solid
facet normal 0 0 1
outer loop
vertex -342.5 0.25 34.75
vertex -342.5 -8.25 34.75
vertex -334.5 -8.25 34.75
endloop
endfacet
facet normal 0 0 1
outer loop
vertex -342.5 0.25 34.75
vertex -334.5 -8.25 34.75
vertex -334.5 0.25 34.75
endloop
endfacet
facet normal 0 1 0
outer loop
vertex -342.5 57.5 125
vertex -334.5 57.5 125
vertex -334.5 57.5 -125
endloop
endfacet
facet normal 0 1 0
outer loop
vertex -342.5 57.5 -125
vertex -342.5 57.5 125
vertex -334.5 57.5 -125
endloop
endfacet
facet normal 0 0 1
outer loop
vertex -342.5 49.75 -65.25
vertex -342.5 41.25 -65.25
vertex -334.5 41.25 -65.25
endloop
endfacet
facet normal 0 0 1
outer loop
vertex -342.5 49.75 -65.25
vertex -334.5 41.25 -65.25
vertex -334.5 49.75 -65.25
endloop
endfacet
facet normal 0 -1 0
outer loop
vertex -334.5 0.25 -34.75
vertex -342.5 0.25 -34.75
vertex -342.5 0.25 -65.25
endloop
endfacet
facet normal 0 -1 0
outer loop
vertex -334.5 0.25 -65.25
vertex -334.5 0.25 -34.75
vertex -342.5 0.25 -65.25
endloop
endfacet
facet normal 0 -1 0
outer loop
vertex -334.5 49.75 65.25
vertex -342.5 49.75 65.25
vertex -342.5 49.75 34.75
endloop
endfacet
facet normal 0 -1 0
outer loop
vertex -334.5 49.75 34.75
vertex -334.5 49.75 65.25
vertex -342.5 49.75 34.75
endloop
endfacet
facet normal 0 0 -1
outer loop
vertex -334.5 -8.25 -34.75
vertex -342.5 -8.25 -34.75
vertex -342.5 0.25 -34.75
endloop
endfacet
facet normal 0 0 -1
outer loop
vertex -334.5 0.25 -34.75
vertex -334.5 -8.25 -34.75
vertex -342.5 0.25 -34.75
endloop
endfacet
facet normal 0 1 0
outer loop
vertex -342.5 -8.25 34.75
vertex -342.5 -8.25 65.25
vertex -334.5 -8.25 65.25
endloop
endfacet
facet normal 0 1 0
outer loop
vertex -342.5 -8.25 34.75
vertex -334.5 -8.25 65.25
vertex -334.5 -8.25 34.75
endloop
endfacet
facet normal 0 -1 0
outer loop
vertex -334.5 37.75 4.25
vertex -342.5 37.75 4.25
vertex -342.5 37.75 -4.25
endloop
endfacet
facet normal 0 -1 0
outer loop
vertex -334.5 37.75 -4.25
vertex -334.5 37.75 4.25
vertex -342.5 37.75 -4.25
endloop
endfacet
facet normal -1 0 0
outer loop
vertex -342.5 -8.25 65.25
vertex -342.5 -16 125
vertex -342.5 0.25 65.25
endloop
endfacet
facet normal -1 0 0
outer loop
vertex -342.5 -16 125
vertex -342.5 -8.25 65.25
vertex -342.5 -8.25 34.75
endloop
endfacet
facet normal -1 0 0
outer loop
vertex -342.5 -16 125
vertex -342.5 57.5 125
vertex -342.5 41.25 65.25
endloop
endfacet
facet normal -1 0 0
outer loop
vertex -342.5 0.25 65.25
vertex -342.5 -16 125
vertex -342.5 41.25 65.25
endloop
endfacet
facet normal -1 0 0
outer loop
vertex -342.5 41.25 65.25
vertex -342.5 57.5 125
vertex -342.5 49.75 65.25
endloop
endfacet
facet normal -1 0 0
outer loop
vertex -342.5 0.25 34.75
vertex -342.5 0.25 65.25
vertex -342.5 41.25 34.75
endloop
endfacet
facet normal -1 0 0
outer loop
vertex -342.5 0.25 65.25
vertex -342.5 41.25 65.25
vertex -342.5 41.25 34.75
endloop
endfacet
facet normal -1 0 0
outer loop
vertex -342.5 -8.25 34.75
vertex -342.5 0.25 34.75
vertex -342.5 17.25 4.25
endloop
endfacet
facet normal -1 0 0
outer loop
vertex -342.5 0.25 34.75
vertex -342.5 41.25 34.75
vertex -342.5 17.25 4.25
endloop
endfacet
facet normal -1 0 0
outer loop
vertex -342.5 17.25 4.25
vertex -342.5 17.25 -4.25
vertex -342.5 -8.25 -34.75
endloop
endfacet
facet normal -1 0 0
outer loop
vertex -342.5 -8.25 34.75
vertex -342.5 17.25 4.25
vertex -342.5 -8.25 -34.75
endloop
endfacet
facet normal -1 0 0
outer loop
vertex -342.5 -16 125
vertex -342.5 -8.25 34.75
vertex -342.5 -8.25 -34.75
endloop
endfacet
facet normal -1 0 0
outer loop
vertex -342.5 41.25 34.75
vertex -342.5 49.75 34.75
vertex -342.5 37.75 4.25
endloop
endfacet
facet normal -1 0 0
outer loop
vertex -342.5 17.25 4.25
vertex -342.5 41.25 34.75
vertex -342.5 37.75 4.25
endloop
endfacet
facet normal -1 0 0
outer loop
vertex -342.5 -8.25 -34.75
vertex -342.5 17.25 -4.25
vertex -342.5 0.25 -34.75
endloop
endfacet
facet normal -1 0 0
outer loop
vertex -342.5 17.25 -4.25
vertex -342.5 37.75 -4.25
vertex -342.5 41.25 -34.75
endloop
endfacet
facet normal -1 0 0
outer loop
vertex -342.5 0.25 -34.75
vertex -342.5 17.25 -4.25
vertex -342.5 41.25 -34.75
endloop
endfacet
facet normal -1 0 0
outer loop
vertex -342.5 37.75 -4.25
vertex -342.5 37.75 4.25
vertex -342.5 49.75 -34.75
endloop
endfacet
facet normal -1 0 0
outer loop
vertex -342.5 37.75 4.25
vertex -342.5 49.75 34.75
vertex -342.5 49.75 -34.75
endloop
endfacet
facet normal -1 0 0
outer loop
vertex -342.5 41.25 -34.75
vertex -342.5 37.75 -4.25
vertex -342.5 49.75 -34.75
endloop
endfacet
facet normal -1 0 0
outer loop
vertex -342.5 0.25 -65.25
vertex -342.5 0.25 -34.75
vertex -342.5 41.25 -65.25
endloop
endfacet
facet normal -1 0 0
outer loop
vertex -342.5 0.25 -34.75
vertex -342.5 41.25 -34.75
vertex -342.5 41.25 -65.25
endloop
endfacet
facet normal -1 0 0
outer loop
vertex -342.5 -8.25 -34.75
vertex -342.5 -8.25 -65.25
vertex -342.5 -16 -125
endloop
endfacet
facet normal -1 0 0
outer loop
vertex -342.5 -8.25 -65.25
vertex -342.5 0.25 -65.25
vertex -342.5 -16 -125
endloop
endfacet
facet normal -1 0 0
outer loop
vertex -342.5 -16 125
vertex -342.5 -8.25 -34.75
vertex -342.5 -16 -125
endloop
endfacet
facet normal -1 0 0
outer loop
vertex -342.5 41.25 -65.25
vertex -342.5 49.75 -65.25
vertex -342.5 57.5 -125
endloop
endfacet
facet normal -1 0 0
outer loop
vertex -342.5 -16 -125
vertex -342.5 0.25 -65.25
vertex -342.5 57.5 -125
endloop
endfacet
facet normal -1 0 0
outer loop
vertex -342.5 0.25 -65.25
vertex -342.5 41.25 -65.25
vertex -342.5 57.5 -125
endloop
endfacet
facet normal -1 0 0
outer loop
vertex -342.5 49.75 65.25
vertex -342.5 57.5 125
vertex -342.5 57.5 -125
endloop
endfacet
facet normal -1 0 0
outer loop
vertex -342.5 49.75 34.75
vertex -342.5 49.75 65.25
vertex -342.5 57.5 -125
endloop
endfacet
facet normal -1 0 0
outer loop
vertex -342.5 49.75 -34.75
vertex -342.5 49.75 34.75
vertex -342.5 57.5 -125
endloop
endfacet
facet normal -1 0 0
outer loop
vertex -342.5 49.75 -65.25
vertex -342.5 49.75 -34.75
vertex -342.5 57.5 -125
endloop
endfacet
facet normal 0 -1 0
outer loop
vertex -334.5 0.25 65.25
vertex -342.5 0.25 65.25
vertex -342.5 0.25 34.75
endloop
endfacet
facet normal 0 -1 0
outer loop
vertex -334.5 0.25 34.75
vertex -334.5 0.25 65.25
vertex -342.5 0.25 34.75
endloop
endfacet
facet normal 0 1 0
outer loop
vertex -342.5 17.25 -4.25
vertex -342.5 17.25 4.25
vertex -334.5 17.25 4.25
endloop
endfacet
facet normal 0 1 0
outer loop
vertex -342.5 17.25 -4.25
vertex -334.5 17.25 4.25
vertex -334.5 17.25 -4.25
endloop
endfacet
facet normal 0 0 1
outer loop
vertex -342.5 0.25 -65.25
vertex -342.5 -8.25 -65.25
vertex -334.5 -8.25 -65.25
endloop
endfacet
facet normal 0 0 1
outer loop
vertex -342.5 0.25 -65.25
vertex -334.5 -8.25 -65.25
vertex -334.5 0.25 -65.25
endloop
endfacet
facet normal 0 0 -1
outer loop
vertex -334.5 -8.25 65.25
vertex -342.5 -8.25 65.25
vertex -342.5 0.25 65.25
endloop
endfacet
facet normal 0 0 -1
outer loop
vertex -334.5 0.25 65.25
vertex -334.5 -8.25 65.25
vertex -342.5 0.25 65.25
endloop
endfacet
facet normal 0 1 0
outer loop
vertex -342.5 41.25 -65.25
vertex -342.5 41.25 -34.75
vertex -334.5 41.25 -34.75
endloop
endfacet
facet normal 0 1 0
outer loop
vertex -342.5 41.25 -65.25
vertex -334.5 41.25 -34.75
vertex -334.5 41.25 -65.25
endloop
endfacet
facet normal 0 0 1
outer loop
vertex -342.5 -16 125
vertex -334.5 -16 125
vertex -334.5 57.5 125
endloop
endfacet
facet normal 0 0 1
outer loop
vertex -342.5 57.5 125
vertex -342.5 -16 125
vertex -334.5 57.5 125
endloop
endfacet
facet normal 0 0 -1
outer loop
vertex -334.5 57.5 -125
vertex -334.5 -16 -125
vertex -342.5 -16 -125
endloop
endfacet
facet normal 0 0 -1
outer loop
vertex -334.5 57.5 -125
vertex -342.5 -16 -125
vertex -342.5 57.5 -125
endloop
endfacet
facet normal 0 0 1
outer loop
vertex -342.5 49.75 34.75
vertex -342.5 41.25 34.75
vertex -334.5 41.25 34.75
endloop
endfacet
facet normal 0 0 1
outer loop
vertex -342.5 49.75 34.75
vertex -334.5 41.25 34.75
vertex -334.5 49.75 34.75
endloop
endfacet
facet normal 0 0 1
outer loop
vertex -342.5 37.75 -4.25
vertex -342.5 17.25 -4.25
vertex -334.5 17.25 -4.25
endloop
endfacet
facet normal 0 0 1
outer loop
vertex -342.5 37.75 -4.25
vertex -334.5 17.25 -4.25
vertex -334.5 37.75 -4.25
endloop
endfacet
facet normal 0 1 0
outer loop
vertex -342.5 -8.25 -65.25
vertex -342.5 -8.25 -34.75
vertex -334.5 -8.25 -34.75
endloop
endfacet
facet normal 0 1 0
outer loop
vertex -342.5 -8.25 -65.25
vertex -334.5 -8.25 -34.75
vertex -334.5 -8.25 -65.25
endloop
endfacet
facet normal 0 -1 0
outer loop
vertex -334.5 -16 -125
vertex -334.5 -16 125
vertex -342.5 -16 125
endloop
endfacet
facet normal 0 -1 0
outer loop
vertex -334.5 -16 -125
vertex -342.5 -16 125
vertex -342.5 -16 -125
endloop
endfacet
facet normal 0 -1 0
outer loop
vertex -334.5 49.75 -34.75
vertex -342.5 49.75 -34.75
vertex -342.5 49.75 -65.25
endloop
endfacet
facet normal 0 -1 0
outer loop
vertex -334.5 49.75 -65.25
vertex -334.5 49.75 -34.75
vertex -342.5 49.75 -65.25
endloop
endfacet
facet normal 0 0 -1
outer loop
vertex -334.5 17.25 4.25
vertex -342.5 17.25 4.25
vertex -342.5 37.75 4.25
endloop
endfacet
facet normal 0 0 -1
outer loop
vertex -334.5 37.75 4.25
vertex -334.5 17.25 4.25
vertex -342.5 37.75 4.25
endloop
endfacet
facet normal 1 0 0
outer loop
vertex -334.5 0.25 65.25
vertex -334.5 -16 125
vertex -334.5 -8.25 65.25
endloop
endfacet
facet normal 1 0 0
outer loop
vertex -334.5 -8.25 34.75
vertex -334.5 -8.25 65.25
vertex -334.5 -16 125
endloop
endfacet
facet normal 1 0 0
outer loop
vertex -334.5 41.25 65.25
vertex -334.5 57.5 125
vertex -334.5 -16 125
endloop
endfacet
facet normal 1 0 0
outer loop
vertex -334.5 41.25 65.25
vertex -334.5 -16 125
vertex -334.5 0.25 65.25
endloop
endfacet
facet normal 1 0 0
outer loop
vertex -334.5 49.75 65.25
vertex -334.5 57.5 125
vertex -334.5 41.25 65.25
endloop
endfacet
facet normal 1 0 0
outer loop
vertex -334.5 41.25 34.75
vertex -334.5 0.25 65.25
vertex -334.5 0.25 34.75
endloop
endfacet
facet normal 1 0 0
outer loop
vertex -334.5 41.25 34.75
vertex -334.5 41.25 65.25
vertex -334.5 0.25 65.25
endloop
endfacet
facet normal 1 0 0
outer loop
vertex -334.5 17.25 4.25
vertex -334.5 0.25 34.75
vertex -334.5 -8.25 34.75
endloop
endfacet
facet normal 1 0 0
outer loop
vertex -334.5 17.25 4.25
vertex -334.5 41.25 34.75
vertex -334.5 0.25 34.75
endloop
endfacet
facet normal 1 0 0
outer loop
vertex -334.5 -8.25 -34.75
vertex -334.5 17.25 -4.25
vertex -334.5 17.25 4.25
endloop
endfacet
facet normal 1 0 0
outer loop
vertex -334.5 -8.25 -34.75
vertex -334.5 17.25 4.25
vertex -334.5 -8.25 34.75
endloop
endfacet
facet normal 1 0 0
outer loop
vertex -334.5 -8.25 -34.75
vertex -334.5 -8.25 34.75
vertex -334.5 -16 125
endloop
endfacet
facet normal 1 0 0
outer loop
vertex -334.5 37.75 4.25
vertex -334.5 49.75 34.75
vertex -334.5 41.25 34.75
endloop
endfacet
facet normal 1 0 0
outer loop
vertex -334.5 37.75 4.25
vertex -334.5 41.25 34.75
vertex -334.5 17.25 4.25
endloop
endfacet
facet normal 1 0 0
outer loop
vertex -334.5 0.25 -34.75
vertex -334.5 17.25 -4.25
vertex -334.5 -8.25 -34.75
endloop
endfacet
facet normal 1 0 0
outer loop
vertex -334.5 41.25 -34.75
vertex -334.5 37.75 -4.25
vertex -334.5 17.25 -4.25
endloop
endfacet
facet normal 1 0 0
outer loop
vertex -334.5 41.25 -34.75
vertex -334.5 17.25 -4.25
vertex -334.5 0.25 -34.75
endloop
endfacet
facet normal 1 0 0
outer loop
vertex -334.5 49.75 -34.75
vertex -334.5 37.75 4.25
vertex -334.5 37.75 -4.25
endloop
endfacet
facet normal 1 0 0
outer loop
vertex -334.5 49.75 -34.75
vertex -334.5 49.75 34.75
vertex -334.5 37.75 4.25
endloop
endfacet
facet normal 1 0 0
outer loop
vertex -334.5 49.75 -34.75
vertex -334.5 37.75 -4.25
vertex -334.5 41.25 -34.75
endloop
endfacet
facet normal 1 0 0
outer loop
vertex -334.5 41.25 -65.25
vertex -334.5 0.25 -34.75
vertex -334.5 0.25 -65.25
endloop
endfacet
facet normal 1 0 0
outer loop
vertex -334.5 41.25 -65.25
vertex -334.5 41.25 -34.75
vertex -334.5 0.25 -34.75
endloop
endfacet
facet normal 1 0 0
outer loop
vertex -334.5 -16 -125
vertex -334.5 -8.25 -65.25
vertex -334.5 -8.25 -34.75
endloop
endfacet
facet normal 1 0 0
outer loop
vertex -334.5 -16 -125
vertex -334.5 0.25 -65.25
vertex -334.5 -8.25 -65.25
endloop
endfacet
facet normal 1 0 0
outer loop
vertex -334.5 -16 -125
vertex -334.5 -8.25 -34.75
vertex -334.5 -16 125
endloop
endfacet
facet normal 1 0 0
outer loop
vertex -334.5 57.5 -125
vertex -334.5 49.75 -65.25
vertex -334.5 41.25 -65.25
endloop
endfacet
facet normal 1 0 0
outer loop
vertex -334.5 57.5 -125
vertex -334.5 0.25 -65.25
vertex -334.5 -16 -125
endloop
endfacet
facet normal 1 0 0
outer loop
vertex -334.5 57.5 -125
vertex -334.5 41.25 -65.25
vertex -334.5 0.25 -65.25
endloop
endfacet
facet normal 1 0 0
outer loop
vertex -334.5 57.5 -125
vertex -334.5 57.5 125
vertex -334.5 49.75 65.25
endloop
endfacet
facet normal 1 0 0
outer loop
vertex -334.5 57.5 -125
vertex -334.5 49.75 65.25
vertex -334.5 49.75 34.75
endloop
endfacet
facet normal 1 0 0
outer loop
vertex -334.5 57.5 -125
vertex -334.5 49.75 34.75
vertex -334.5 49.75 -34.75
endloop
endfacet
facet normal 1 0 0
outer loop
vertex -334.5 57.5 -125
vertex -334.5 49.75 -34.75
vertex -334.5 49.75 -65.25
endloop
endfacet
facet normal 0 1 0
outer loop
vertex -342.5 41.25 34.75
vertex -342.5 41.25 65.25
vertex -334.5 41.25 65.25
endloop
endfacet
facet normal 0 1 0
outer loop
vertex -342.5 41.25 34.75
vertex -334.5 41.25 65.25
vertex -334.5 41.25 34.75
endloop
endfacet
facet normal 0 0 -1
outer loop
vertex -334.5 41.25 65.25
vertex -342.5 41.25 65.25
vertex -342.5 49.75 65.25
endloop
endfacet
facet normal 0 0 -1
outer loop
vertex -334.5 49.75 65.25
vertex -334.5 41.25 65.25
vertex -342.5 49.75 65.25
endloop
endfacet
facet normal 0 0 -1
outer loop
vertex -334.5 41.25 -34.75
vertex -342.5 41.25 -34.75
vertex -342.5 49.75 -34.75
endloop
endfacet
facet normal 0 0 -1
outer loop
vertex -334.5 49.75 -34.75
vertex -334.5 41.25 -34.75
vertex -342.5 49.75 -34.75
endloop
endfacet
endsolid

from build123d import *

# Parameters (mm, degrees)
SKETCH1_W           = 685
SKETCH1_H           = 250
BASE_FLANGE1_DEPTH  = 8
SKETCH6_W           = 60
SKETCH6_H           = 8
SKETCH6_W_2         = 70
EXTRUDE1_DEPTH      = 8
SKETCH7_W           = 250
SKETCH7_H           = 73.5
BASE_FLANGE2_DEPTH  = 8
SKETCH12_W          = 30.5
SKETCH12_H          = 8.5
EXTRUDE2_DEPTH      = 699.681794525
SKETCH14_W          = 250
SKETCH14_H          = 8
BASE_FLANGE3_DEPTH  = 50.5
SKETCH19_W          = 60
SKETCH19_H          = 8
SKETCH19_W_2        = 70
EXTRUDE3_DEPTH      = 8
BREAK_CORNER1_START = 41.5
BREAK_CORNER1_DEPTH = 8
EXTRUDE4_DEPTH      = 8
BASE_FLANGE4_DEPTH  = 8
SKETCH38_W          = 8.5
SKETCH38_H          = 20.5
EXTRUDE5_DEPTH      = 10
SKETCH39_W          = 20.5
SKETCH39_H          = 8.5
EXTRUDE6_DEPTH      = 10


# Read off the part's stored shape, not the designer's step: Break-Corner1
# Sheet-metal steps are written as plain solids
with BuildPart() as part:
    # Sketch1 → Base-Flange1 (new body)
    with BuildSketch(Plane(origin=(0, 0, 0), x_dir=(1, 0, 0), z_dir=(0, 1, 0))):
        Rectangle(SKETCH1_W, SKETCH1_H)
    extrude(amount=-BASE_FLANGE1_DEPTH)

    # Sketch6 → Extrude1 (cut)
    with BuildSketch(Plane(origin=(342.5, 0, 0), x_dir=(0, 0, -1), z_dir=(1, 0, 0))):
        with Locations((-95, -4)):
            Rectangle(SKETCH6_W, SKETCH6_H)
        with Locations((95, -4)):
            Rectangle(SKETCH6_W, SKETCH6_H)
        with Locations((0, -4)):
            Rectangle(SKETCH6_W_2, SKETCH6_H)
    extrude1 = extrude(amount=-EXTRUDE1_DEPTH, mode=Mode.SUBTRACT)

    # Mirror1: Extrude1 across plane
    add(extrude1.mirror(Plane(origin=(0, 0, 0), x_dir=(0, 0, 1), z_dir=(1, 0, 0))), mode=Mode.SUBTRACT)

    # Sketch39 → Extrude6 (cut)
    with BuildSketch(Plane.XZ.offset(8)):
        with Locations((289.5, 0)):
            Rectangle(SKETCH39_W, SKETCH39_H)
        with Locations((229.5, 0)):
            Rectangle(SKETCH39_W, SKETCH39_H)
        with Locations((-289.5, 0)):
            Rectangle(SKETCH39_W, SKETCH39_H)
        with Locations((-229.5, 0)):
            Rectangle(SKETCH39_W, SKETCH39_H)
    extrude(amount=-EXTRUDE6_DEPTH, mode=Mode.SUBTRACT)


with BuildPart() as body_2:
    # Sketch7 → Base-Flange2 (new body)
    with BuildSketch(Plane(origin=(334.5, 0, 0), x_dir=(0, 0, -1), z_dir=(1, 0, 0))):
        with Locations((0, 20.75)):
            Rectangle(SKETCH7_W, SKETCH7_H)
    extrude(amount=BASE_FLANGE2_DEPTH)

    # Sketch12 → Extrude2 (cut, through all)
    with BuildSketch(Plane(origin=(342.5, 0, 0), x_dir=(0, 0, -1), z_dir=(1, 0, 0))):
        with Locations((-50, -4)):
            Rectangle(SKETCH12_W, SKETCH12_H)
        with Locations((50, -4)):
            Rectangle(SKETCH12_W, SKETCH12_H)
        with Locations((50, 45.5)):
            Rectangle(SKETCH12_W, SKETCH12_H)
        with Locations((-50, 45.5)):
            Rectangle(SKETCH12_W, SKETCH12_H)
    extrude(amount=-EXTRUDE2_DEPTH, mode=Mode.SUBTRACT)

    # Sketch38 → Extrude5 (cut)
    with BuildSketch(Plane(origin=(342.5, 0, 0), x_dir=(0, 0, -1), z_dir=(1, 0, 0))):
        with Locations((0, 27.5)):
            Rectangle(SKETCH38_W, SKETCH38_H)
    extrude(amount=-EXTRUDE5_DEPTH, mode=Mode.SUBTRACT)


with BuildPart() as body_3:
    # Sketch14 → Base-Flange3 (new body)
    with BuildSketch(Plane.ZY.offset(-334.5)):
        with Locations((0, 45.5)):
            Rectangle(SKETCH14_W, SKETCH14_H)
    extrude(amount=-BASE_FLANGE3_DEPTH)

    # Sketch19 → Extrude3 (cut)
    with BuildSketch(Plane(origin=(342.5, 0, 0), x_dir=(0, 0, -1), z_dir=(1, 0, 0))):
        with Locations((95, 45.5)):
            Rectangle(SKETCH19_W, SKETCH19_H)
        with Locations((0, 45.5)):
            Rectangle(SKETCH19_W_2, SKETCH19_H)
        with Locations((-95, 45.5)):
            Rectangle(SKETCH19_W, SKETCH19_H)
    extrude(amount=-EXTRUDE3_DEPTH, mode=Mode.SUBTRACT)

    # Break-Corner1 outline → Break-Corner1 (cut)
    with BuildSketch(Plane(origin=(0, 0, 0), x_dir=(1, 0, 0), z_dir=(0, 1, 0)).offset(BREAK_CORNER1_START)):
        Polygon((385, -125), (385, -110), (370, -125), align=None)
        Polygon((370, 125), (385, 110), (385, 125), align=None)
    extrude(amount=BREAK_CORNER1_DEPTH, mode=Mode.SUBTRACT)

    # Sketch20 → Extrude4 (cut)
    with BuildSketch(Plane(origin=(0, 49.5, 0), x_dir=(1, 0, 0), z_dir=(0, 1, 0))):
        with BuildLine():
            Line((367, 75), (367, 55))
            ThreePointArc((367, 55), (362.5, 50.5), (358, 55))
            Line((358, 55), (358, 75))
            ThreePointArc((358, 75), (362.5, 79.5), (367, 75))
        make_face()
        with BuildLine():
            Line((367, -75), (367, -55))
            ThreePointArc((367, -55), (362.5, -50.5), (358, -55))
            Line((358, -55), (358, -75))
            ThreePointArc((358, -75), (362.5, -79.5), (367, -75))
        make_face()
    extrude(amount=-EXTRUDE4_DEPTH, mode=Mode.SUBTRACT)


with BuildPart() as body_4:
    # Mirror4: mirrored copy
    add(body_3.part.mirror(Plane(origin=(0, 0, 0), x_dir=(0, 0, 1), z_dir=(1, 0, 0))))


with BuildPart() as body_5:
    # Sketch29 → Base-Flange4 (new body)
    with BuildSketch(Plane.XY.offset(4)):
        Polygon((219.5, 0), (219.5, -8), (239.5, -8), (239.5, 0), (279.5, 0), (279.5, -8), (299.5, -8), (299.5, 0), (334.5, 0), (334.5, 17.5), (342.5, 17.5), (342.5, 37.5), (334.5, 37.5), (334.5, 57.5), (194.5, 10), (194.5, 0), align=None)
    extrude(amount=-BASE_FLANGE4_DEPTH)


with BuildPart() as body_6:
    # Mirror5: mirrored copy
    add(body_5.part.mirror(Plane(origin=(0, 0, 0), x_dir=(0, 0, 1), z_dir=(1, 0, 0))))


with BuildPart() as body_7:
    # Mirror3: mirrored copy
    add(body_2.part.mirror(Plane(origin=(0, 0, 0), x_dir=(0, 0, 1), z_dir=(1, 0, 0))))


solid = body_7.part
